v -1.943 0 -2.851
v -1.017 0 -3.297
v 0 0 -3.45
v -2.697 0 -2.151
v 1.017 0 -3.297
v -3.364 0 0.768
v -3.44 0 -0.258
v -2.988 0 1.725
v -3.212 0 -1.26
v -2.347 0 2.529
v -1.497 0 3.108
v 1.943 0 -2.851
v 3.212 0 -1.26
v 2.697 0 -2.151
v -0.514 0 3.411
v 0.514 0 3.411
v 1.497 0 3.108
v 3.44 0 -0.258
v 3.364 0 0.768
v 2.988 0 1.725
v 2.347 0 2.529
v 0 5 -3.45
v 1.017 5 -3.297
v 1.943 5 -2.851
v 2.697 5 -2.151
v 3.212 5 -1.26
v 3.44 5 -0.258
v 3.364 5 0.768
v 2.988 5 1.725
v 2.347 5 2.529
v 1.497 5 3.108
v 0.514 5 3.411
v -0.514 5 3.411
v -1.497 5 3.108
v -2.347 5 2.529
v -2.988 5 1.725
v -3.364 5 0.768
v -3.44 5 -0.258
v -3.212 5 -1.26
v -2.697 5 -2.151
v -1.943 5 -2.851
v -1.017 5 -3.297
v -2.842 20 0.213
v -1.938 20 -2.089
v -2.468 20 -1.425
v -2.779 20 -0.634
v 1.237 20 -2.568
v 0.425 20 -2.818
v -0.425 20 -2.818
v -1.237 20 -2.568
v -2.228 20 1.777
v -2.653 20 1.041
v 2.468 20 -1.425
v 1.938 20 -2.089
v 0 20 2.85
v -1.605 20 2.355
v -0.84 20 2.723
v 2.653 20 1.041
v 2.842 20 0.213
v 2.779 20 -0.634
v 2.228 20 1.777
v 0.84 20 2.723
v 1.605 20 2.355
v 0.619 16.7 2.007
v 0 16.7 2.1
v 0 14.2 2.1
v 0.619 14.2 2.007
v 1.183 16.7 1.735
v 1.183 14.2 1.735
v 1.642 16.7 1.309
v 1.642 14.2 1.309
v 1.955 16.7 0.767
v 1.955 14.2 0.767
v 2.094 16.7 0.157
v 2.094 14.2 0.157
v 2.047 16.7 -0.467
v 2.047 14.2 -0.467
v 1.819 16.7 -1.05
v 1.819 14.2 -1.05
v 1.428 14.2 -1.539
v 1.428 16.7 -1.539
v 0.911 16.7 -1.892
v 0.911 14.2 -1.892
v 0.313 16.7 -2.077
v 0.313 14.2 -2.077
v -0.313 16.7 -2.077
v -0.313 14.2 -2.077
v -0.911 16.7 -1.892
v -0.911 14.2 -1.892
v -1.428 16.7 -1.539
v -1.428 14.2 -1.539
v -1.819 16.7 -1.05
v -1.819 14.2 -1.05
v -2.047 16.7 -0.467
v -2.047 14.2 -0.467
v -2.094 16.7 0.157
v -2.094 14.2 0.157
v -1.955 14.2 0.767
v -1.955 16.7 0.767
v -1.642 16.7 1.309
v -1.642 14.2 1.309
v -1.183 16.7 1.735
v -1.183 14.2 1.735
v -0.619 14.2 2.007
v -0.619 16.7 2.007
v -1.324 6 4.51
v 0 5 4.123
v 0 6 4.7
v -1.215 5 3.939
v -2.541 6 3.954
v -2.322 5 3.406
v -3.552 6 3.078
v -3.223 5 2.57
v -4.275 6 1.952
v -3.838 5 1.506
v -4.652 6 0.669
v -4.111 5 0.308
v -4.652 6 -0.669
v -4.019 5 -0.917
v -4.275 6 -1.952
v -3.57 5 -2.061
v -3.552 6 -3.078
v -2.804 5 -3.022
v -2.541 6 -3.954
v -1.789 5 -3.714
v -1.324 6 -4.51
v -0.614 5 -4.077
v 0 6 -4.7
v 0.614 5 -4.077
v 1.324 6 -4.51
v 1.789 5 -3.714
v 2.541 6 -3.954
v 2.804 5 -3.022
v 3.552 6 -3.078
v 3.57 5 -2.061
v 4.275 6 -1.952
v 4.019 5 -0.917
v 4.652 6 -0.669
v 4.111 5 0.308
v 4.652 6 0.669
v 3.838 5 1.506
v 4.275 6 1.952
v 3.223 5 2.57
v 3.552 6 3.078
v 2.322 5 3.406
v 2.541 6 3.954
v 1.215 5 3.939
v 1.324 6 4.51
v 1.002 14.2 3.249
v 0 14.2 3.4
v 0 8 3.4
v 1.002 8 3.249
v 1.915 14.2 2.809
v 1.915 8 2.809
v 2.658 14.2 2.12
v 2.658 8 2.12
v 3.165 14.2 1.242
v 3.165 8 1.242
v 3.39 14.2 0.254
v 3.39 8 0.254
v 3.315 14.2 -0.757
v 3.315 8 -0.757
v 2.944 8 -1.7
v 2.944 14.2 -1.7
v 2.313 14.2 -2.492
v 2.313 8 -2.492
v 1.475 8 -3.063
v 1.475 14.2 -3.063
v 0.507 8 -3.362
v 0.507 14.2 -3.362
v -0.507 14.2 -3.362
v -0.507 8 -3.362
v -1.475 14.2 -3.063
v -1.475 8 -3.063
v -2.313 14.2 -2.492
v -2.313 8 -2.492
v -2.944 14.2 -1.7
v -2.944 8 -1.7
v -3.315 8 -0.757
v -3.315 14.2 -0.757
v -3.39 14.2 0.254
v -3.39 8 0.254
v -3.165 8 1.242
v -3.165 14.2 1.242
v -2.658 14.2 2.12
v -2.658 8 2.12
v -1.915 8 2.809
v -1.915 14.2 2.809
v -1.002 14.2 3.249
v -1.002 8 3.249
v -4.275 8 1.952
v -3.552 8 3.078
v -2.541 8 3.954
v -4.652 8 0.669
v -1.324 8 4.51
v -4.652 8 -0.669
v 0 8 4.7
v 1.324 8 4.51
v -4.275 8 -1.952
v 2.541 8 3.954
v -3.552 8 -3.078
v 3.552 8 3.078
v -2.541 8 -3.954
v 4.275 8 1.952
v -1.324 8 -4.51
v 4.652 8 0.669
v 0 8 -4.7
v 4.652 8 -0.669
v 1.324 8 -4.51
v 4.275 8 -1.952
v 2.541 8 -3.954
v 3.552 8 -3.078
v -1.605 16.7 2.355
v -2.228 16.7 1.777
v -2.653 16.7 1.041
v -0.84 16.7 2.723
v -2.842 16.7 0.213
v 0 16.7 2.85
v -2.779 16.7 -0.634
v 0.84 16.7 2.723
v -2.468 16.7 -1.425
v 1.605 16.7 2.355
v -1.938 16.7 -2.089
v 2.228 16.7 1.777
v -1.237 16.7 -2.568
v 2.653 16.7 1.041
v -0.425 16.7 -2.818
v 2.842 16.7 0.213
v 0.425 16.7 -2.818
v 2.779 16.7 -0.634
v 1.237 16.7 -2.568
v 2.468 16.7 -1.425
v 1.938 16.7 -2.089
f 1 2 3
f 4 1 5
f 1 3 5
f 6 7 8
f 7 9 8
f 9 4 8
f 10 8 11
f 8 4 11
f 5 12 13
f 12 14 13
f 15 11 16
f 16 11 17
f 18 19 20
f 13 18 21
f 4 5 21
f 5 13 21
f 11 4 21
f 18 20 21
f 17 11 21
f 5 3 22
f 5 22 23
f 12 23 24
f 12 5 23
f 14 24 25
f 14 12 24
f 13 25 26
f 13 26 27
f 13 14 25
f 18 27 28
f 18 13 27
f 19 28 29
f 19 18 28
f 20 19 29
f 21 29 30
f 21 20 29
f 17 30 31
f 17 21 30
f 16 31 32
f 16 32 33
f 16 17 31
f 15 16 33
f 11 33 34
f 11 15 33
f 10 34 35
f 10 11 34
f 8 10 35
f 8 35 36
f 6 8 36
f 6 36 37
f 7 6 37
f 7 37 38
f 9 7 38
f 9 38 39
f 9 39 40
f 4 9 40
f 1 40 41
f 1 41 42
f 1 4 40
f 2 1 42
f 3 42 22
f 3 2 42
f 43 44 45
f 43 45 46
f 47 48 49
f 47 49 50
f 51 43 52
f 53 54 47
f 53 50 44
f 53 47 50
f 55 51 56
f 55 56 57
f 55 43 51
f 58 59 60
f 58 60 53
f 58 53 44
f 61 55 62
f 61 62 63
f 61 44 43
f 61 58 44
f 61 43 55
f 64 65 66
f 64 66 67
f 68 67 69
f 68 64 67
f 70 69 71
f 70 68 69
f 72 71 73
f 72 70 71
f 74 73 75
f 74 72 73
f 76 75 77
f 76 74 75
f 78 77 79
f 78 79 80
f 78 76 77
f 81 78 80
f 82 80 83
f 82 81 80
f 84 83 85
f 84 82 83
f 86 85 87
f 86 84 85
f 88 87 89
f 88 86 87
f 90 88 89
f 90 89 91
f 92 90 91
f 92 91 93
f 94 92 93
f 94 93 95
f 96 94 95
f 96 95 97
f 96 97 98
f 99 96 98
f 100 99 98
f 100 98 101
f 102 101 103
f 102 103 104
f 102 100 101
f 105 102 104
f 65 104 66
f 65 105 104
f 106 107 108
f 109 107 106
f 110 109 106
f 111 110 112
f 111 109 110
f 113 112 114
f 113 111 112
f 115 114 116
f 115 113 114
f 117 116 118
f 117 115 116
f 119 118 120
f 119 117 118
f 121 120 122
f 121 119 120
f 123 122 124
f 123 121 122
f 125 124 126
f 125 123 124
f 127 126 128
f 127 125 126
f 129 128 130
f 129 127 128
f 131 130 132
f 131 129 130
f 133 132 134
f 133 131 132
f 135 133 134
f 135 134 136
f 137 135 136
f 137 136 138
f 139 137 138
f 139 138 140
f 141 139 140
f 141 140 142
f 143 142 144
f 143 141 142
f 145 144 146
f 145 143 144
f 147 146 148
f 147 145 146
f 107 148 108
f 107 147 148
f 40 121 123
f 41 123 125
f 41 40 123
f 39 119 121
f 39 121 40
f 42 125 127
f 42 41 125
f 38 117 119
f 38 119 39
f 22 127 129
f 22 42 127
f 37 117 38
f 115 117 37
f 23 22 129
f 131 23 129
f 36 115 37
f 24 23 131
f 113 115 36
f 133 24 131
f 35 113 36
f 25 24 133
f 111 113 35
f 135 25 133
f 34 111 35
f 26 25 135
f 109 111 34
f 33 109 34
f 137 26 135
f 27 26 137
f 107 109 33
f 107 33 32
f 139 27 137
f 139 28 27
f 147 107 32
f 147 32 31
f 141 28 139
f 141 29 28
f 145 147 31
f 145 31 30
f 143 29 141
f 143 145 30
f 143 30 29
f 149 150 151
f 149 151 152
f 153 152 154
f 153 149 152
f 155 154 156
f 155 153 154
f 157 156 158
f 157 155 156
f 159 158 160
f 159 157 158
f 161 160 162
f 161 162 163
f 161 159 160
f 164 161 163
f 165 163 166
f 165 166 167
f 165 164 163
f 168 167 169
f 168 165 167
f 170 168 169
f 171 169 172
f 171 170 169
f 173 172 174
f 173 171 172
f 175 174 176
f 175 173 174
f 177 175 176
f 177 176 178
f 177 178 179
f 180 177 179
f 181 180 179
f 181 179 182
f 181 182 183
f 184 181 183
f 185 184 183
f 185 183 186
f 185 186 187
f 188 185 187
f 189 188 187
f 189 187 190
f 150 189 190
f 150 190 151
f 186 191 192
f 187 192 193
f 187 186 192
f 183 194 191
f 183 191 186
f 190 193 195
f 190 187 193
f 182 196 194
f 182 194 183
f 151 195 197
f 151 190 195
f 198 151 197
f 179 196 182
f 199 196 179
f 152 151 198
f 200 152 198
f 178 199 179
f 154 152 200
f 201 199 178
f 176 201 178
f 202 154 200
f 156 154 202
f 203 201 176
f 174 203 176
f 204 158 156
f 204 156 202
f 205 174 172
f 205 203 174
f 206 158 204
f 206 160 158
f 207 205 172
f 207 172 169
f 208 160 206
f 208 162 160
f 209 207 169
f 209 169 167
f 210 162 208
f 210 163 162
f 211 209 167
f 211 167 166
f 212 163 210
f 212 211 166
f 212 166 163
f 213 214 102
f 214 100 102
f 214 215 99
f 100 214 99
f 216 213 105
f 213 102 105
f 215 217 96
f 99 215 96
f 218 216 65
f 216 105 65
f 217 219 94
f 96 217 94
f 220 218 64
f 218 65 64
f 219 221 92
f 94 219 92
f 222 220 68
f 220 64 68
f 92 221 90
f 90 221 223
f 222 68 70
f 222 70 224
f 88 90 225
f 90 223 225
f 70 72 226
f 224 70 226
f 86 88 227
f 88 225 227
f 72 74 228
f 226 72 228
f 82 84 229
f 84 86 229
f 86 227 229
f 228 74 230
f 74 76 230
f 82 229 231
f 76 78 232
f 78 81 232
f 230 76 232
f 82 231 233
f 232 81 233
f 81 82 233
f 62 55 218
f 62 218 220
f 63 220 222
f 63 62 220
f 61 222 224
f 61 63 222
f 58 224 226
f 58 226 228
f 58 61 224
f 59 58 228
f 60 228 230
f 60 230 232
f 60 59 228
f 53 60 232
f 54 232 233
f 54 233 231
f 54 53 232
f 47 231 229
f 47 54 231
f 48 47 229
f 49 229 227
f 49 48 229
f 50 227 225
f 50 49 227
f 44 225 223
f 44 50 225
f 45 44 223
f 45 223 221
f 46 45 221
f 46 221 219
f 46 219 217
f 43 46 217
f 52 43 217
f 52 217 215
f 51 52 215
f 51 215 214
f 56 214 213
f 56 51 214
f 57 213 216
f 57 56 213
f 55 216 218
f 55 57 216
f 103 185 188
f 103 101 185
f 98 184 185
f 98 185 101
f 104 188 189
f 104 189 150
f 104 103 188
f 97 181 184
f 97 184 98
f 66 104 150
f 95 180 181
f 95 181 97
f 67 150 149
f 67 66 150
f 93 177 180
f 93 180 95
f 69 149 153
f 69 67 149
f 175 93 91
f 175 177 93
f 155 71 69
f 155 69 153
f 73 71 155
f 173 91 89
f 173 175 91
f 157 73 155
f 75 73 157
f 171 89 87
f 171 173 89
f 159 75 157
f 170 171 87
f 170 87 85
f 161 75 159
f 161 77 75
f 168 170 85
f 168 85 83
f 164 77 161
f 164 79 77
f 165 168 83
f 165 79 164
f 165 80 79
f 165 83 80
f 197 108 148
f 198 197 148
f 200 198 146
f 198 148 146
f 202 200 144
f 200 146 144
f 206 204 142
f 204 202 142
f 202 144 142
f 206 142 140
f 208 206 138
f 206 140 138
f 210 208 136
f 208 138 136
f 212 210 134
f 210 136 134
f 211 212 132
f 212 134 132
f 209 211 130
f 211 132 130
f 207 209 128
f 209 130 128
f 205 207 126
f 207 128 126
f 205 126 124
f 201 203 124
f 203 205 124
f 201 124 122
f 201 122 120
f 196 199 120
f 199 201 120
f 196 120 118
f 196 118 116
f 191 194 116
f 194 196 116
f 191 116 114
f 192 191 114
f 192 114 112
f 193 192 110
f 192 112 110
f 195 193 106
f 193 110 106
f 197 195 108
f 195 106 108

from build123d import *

# Parameters (mm, degrees)
SKETCH1_R           = 4.7
BOSS_EXTRUDE1_DEPTH = 20
SKETCH2_OUTSIDE_W   = 16.202
SKETCH2_OUTSIDE_H   = 16.202
SKETCH2_OUTSIDE_R   = 3.45
CUT_EXTRUDE1_DEPTH  = 5
SKETCH4_OUTSIDE_W   = 16.202
SKETCH4_OUTSIDE_H   = 16.202
SKETCH4_OUTSIDE_R   = 3.4
CUT_EXTRUDE2_DEPTH  = 12
SKETCH5_OUTSIDE_W   = 16.202
SKETCH5_OUTSIDE_H   = 16.202
SKETCH5_OUTSIDE_R   = 2.85
CUT_EXTRUDE3_DEPTH  = 3.3
SKETCH7_OUTSIDE_W   = 16.202
SKETCH7_OUTSIDE_H   = 16.202
SKETCH7_OUTSIDE_R   = 2.1
CUT_EXTRUDE4_DEPTH  = 2.5
CHAMFER1_SIZE       = 1
CHAMFER1_SIZE2      = 0.577350269


with BuildPart() as part:
    # Sketch1 → Boss-Extrude1 (new body)
    with BuildSketch(Plane(origin=(0, 0, 0), x_dir=(1, 0, 0), z_dir=(0, 1, 0))):
        with Locations(Location((0, 0, 0), (0, 0, 270))):  # turned: the seam where the file's is
            Circle(SKETCH1_R)
    extrude(amount=BOSS_EXTRUDE1_DEPTH)

    # Sketch2 outside → Cut-Extrude1 (cut)
    with BuildSketch(Plane.XZ):
        Rectangle(SKETCH2_OUTSIDE_W, SKETCH2_OUTSIDE_H)
        with Locations(Location((0, 0, 0), (0, 0, 270))):  # turned: the seam where the file's is
            Circle(SKETCH2_OUTSIDE_R, mode=Mode.SUBTRACT)
    extrude(amount=-CUT_EXTRUDE1_DEPTH, mode=Mode.SUBTRACT)

    # Sketch4 outside → Cut-Extrude2 (cut)
    with BuildSketch(Plane(origin=(0, 20, 0), x_dir=(1, 0, 0), z_dir=(0, 1, 0))):
        Rectangle(SKETCH4_OUTSIDE_W, SKETCH4_OUTSIDE_H)
        with Locations(Location((0, 0, 0), (0, 0, 270))):  # turned: the seam where the file's is
            Circle(SKETCH4_OUTSIDE_R, mode=Mode.SUBTRACT)
    extrude(amount=-CUT_EXTRUDE2_DEPTH, mode=Mode.SUBTRACT)

    # Sketch5 outside → Cut-Extrude3 (cut)
    with BuildSketch(Plane(origin=(0, 20, 0), x_dir=(1, 0, 0), z_dir=(0, 1, 0))):
        Rectangle(SKETCH5_OUTSIDE_W, SKETCH5_OUTSIDE_H)
        with Locations(Location((0, 0, 0), (0, 0, 270))):  # turned: the seam where the file's is
            Circle(SKETCH5_OUTSIDE_R, mode=Mode.SUBTRACT)
    extrude(amount=-CUT_EXTRUDE3_DEPTH, mode=Mode.SUBTRACT)

    # Sketch7 outside → Cut-Extrude4 (cut)
    with BuildSketch(Plane(origin=(0, 16.7, 0), x_dir=(1, 0, 0), z_dir=(0, 1, 0))):
        Rectangle(SKETCH7_OUTSIDE_W, SKETCH7_OUTSIDE_H)
        with Locations(Location((0, 0, 0), (0, 0, 270))):  # turned: the seam where the file's is
            Circle(SKETCH7_OUTSIDE_R, mode=Mode.SUBTRACT)
    extrude(amount=-CUT_EXTRUDE4_DEPTH, mode=Mode.SUBTRACT)

    # Chamfer1
    chamfer1_edges = [part.edges().sort_by_distance(p)[0] for p in [
        (0, 5, -4.7),
    ]]
    chamfer1_side = [part.faces().sort_by_distance(p)[0] for p in [
        (0, 6.5, -4.7),
    ]]
    chamfer(chamfer1_edges, length=CHAMFER1_SIZE, length2=CHAMFER1_SIZE2, reference=chamfer1_side[0])


solid = part.part
